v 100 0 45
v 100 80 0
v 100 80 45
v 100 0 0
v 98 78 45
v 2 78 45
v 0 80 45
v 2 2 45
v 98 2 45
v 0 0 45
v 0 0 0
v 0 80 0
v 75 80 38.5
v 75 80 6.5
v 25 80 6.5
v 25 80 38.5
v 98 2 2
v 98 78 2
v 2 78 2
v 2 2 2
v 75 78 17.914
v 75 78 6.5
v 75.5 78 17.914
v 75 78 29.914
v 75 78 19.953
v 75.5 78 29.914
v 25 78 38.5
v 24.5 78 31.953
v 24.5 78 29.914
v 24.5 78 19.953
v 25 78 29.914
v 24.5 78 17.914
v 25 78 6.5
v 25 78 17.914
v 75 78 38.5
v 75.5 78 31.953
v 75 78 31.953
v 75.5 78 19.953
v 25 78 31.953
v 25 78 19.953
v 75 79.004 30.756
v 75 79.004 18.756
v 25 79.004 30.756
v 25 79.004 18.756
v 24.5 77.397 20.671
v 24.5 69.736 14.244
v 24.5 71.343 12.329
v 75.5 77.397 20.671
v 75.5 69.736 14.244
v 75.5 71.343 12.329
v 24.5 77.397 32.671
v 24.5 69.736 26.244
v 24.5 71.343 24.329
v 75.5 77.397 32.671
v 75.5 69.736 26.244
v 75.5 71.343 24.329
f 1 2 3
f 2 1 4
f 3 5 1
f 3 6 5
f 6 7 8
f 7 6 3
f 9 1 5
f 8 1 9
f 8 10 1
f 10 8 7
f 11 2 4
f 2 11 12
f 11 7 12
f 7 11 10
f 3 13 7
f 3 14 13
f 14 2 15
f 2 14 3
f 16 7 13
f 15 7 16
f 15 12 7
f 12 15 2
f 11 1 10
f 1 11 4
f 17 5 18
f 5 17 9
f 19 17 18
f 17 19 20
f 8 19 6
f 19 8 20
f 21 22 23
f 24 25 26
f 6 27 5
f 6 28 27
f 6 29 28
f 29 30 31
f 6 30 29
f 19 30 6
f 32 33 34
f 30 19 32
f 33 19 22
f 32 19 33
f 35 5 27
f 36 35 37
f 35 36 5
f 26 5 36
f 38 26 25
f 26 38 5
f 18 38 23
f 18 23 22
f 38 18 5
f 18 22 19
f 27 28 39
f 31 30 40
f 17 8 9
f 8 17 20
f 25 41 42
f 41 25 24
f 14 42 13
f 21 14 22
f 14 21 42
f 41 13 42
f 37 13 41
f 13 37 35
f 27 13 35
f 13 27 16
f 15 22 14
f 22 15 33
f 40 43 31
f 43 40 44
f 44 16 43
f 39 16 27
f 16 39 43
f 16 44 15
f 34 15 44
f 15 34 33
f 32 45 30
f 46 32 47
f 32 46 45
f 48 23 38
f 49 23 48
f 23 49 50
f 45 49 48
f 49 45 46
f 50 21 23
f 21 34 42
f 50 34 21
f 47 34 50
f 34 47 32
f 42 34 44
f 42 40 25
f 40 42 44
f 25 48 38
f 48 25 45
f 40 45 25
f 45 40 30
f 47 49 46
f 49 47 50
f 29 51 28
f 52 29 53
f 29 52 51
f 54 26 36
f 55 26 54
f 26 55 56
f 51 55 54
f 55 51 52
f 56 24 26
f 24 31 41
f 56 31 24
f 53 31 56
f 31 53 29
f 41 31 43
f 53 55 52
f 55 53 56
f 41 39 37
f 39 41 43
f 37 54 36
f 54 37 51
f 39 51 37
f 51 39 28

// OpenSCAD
$fn = 32;

// ----------------------------------------------------------------------
// Vent box: louvers enclosure
// ----------------------------------------------------------------------

// --- parameters (mm) ---
box_l = 100;              // box length, X
box_w = 80;               // box width, Y
box_h = 45;               // box height, Z
wall_t = 2;               // shell wall thickness
win_l = 50;               // vent window width, X
win_h = 32;               // vent window height, Z
slat_t = 2.5;             // louver slat thickness
slat_d = 10;              // louver slat depth
slat_a = 40;              // louver slat angle, degrees
slat_pitch = 12;          // louver pitch
slat_yc = 74.37;          // slat centreline Y
fit_tol = 0.1;            // tolerance for press fits, mm
free_tol = 0.3;           // tolerance for clearance fits, mm

win_z0 = (box_h - win_h) / 2;  // window lower edge Z
n_slats = 2;  // louver count
slat_z0 = win_z0 + (win_h - (n_slats - 1) * slat_pitch) / 2;

difference() {
  union() {
    difference() {
      cube([box_l, box_w, box_h]);
  translate([wall_t, wall_t, wall_t])
    cube([box_l - 2 * wall_t, box_w - 2 * wall_t, box_h]);
  translate([(box_l - win_l) / 2, box_w - wall_t - 1, win_z0])
    cube([win_l, wall_t + 2, win_h]);
    }
    for (i = [0 : n_slats - 1])
      translate([box_l / 2, slat_yc, slat_z0 + i * slat_pitch])
        rotate([slat_a, 0, 0])
          cube([win_l + 1, slat_d, slat_t], center = true);
  }
}
